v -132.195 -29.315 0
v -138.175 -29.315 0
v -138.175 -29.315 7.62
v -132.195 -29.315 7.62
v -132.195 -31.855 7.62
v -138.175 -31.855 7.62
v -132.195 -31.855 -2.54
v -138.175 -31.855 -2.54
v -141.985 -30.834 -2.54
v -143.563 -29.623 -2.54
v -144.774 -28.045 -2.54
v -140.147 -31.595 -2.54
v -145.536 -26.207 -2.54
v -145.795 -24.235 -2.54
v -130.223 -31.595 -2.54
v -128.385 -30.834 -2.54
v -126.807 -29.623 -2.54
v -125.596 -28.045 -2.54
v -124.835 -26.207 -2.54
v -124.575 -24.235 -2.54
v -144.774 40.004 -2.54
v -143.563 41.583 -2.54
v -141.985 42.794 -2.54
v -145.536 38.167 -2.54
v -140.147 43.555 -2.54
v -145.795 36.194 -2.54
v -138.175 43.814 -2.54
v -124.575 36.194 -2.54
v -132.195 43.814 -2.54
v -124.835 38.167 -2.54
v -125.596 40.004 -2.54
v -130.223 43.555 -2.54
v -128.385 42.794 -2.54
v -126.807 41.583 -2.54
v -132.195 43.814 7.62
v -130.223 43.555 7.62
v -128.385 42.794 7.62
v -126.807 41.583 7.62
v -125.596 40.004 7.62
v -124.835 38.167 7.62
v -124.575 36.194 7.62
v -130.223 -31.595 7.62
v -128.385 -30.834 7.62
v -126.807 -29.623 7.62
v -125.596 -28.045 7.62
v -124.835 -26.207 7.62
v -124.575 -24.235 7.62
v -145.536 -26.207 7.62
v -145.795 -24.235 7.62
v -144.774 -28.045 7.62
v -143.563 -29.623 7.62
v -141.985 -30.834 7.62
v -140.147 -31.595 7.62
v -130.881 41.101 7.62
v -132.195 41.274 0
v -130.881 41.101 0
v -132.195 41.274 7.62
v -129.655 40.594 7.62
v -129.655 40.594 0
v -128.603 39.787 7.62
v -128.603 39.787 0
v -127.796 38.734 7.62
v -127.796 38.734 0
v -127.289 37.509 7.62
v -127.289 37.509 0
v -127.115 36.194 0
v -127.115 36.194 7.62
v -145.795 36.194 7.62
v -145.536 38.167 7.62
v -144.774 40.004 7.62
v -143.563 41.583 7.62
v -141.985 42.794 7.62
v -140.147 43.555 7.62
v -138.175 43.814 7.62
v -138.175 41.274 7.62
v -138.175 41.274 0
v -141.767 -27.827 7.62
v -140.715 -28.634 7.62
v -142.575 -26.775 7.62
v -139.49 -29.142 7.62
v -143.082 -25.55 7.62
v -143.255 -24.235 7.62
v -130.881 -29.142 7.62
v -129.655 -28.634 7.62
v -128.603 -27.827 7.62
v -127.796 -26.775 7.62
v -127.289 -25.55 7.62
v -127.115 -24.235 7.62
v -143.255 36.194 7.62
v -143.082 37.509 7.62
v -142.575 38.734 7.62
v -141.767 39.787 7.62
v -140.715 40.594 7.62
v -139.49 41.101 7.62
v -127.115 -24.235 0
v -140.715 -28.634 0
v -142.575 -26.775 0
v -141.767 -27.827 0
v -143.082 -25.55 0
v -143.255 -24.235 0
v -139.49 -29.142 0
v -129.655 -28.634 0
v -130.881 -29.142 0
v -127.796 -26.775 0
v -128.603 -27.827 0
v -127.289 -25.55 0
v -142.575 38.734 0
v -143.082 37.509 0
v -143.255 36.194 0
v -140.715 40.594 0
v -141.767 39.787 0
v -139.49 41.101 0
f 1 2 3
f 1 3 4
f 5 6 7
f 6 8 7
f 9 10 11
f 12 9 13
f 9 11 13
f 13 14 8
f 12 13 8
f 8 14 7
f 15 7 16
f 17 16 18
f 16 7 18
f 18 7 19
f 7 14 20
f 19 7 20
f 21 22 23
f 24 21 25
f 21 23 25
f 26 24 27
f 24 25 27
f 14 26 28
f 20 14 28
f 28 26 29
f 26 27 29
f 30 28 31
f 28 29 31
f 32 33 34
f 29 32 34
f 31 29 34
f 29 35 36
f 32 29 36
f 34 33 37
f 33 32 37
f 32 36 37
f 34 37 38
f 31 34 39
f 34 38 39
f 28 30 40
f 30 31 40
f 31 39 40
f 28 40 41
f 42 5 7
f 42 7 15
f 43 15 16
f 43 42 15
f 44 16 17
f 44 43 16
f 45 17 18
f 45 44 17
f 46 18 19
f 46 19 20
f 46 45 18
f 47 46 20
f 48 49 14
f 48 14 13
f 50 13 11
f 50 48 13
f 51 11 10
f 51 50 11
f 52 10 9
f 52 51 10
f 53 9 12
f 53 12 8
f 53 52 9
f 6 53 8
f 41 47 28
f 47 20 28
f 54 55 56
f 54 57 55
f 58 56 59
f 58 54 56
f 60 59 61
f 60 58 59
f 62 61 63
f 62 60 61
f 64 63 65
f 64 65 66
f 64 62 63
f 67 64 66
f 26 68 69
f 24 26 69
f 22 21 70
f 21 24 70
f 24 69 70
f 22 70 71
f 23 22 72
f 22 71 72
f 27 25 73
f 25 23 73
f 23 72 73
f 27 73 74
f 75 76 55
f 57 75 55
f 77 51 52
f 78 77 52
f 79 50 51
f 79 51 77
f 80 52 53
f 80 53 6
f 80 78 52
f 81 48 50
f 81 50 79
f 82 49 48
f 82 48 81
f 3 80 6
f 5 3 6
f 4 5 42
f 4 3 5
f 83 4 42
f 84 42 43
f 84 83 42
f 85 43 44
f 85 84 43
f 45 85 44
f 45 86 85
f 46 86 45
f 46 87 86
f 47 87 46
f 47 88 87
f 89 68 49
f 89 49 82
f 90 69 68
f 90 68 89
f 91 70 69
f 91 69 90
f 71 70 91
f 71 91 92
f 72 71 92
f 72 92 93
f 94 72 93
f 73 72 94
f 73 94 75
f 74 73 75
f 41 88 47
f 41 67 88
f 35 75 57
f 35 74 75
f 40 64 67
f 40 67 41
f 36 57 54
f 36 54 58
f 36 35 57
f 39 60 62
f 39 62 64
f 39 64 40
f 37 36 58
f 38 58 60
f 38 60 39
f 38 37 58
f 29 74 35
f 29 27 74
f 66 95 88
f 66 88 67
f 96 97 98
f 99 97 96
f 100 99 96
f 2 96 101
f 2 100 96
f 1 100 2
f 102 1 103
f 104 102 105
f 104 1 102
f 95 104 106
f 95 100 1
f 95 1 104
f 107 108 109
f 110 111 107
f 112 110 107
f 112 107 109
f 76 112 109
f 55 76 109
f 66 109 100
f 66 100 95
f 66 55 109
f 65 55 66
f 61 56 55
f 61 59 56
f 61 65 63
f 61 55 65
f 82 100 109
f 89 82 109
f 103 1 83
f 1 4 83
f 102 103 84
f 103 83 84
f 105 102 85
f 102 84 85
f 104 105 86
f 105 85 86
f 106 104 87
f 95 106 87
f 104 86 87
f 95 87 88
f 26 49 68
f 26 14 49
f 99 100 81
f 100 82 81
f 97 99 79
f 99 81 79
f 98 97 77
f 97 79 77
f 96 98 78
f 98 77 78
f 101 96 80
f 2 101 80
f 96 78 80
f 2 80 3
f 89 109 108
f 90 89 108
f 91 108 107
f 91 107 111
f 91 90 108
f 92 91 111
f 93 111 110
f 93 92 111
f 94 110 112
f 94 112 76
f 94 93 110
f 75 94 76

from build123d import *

# Parameters (mm, degrees)
F0_W     = 16.1397904158
F0_H     = 70.5894511193
F1_DEPTH = 7.62
F2_R     = 5.08
F3_R     = 5.08
F4_R     = 5.08
F5_R     = 5.08
F6_T     = 2.54


with BuildPart() as f1:
    # F0 (on Top) → F1 (new body)
    with BuildSketch(Plane.XY):
        with Locations((-135.1853534579, 5.979702808)):
            Rectangle(F0_W, F0_H)
    extrude(amount=F1_DEPTH)

    # F2
    f2_edges = [f1.edges().sort_by_distance(p)[0] for p in [
        (-143.255249, -29.315023, 3.81),
    ]]
    fillet(f2_edges, radius=F2_R)

    # F3
    f3_edges = [f1.edges().sort_by_distance(p)[0] for p in [
        (-127.115458, -29.315023, 3.81),
    ]]
    fillet(f3_edges, radius=F3_R)

    # F4
    f4_edges = [f1.edges().sort_by_distance(p)[0] for p in [
        (-143.255249, 41.274428, 3.81),
    ]]
    fillet(f4_edges, radius=F4_R)

    # F5
    f5_edges = [f1.edges().sort_by_distance(p)[0] for p in [
        (-127.115458, 41.274428, 3.81),
    ]]
    fillet(f5_edges, radius=F5_R)

    # F6
    f6_openings = [f1.faces().sort_by_distance(p)[0] for p in [
        (-135.185353, 5.979703, 7.62),
    ]]
    offset(amount=F6_T, openings=f6_openings, kind=Kind.INTERSECTION)


solid = f1.part
